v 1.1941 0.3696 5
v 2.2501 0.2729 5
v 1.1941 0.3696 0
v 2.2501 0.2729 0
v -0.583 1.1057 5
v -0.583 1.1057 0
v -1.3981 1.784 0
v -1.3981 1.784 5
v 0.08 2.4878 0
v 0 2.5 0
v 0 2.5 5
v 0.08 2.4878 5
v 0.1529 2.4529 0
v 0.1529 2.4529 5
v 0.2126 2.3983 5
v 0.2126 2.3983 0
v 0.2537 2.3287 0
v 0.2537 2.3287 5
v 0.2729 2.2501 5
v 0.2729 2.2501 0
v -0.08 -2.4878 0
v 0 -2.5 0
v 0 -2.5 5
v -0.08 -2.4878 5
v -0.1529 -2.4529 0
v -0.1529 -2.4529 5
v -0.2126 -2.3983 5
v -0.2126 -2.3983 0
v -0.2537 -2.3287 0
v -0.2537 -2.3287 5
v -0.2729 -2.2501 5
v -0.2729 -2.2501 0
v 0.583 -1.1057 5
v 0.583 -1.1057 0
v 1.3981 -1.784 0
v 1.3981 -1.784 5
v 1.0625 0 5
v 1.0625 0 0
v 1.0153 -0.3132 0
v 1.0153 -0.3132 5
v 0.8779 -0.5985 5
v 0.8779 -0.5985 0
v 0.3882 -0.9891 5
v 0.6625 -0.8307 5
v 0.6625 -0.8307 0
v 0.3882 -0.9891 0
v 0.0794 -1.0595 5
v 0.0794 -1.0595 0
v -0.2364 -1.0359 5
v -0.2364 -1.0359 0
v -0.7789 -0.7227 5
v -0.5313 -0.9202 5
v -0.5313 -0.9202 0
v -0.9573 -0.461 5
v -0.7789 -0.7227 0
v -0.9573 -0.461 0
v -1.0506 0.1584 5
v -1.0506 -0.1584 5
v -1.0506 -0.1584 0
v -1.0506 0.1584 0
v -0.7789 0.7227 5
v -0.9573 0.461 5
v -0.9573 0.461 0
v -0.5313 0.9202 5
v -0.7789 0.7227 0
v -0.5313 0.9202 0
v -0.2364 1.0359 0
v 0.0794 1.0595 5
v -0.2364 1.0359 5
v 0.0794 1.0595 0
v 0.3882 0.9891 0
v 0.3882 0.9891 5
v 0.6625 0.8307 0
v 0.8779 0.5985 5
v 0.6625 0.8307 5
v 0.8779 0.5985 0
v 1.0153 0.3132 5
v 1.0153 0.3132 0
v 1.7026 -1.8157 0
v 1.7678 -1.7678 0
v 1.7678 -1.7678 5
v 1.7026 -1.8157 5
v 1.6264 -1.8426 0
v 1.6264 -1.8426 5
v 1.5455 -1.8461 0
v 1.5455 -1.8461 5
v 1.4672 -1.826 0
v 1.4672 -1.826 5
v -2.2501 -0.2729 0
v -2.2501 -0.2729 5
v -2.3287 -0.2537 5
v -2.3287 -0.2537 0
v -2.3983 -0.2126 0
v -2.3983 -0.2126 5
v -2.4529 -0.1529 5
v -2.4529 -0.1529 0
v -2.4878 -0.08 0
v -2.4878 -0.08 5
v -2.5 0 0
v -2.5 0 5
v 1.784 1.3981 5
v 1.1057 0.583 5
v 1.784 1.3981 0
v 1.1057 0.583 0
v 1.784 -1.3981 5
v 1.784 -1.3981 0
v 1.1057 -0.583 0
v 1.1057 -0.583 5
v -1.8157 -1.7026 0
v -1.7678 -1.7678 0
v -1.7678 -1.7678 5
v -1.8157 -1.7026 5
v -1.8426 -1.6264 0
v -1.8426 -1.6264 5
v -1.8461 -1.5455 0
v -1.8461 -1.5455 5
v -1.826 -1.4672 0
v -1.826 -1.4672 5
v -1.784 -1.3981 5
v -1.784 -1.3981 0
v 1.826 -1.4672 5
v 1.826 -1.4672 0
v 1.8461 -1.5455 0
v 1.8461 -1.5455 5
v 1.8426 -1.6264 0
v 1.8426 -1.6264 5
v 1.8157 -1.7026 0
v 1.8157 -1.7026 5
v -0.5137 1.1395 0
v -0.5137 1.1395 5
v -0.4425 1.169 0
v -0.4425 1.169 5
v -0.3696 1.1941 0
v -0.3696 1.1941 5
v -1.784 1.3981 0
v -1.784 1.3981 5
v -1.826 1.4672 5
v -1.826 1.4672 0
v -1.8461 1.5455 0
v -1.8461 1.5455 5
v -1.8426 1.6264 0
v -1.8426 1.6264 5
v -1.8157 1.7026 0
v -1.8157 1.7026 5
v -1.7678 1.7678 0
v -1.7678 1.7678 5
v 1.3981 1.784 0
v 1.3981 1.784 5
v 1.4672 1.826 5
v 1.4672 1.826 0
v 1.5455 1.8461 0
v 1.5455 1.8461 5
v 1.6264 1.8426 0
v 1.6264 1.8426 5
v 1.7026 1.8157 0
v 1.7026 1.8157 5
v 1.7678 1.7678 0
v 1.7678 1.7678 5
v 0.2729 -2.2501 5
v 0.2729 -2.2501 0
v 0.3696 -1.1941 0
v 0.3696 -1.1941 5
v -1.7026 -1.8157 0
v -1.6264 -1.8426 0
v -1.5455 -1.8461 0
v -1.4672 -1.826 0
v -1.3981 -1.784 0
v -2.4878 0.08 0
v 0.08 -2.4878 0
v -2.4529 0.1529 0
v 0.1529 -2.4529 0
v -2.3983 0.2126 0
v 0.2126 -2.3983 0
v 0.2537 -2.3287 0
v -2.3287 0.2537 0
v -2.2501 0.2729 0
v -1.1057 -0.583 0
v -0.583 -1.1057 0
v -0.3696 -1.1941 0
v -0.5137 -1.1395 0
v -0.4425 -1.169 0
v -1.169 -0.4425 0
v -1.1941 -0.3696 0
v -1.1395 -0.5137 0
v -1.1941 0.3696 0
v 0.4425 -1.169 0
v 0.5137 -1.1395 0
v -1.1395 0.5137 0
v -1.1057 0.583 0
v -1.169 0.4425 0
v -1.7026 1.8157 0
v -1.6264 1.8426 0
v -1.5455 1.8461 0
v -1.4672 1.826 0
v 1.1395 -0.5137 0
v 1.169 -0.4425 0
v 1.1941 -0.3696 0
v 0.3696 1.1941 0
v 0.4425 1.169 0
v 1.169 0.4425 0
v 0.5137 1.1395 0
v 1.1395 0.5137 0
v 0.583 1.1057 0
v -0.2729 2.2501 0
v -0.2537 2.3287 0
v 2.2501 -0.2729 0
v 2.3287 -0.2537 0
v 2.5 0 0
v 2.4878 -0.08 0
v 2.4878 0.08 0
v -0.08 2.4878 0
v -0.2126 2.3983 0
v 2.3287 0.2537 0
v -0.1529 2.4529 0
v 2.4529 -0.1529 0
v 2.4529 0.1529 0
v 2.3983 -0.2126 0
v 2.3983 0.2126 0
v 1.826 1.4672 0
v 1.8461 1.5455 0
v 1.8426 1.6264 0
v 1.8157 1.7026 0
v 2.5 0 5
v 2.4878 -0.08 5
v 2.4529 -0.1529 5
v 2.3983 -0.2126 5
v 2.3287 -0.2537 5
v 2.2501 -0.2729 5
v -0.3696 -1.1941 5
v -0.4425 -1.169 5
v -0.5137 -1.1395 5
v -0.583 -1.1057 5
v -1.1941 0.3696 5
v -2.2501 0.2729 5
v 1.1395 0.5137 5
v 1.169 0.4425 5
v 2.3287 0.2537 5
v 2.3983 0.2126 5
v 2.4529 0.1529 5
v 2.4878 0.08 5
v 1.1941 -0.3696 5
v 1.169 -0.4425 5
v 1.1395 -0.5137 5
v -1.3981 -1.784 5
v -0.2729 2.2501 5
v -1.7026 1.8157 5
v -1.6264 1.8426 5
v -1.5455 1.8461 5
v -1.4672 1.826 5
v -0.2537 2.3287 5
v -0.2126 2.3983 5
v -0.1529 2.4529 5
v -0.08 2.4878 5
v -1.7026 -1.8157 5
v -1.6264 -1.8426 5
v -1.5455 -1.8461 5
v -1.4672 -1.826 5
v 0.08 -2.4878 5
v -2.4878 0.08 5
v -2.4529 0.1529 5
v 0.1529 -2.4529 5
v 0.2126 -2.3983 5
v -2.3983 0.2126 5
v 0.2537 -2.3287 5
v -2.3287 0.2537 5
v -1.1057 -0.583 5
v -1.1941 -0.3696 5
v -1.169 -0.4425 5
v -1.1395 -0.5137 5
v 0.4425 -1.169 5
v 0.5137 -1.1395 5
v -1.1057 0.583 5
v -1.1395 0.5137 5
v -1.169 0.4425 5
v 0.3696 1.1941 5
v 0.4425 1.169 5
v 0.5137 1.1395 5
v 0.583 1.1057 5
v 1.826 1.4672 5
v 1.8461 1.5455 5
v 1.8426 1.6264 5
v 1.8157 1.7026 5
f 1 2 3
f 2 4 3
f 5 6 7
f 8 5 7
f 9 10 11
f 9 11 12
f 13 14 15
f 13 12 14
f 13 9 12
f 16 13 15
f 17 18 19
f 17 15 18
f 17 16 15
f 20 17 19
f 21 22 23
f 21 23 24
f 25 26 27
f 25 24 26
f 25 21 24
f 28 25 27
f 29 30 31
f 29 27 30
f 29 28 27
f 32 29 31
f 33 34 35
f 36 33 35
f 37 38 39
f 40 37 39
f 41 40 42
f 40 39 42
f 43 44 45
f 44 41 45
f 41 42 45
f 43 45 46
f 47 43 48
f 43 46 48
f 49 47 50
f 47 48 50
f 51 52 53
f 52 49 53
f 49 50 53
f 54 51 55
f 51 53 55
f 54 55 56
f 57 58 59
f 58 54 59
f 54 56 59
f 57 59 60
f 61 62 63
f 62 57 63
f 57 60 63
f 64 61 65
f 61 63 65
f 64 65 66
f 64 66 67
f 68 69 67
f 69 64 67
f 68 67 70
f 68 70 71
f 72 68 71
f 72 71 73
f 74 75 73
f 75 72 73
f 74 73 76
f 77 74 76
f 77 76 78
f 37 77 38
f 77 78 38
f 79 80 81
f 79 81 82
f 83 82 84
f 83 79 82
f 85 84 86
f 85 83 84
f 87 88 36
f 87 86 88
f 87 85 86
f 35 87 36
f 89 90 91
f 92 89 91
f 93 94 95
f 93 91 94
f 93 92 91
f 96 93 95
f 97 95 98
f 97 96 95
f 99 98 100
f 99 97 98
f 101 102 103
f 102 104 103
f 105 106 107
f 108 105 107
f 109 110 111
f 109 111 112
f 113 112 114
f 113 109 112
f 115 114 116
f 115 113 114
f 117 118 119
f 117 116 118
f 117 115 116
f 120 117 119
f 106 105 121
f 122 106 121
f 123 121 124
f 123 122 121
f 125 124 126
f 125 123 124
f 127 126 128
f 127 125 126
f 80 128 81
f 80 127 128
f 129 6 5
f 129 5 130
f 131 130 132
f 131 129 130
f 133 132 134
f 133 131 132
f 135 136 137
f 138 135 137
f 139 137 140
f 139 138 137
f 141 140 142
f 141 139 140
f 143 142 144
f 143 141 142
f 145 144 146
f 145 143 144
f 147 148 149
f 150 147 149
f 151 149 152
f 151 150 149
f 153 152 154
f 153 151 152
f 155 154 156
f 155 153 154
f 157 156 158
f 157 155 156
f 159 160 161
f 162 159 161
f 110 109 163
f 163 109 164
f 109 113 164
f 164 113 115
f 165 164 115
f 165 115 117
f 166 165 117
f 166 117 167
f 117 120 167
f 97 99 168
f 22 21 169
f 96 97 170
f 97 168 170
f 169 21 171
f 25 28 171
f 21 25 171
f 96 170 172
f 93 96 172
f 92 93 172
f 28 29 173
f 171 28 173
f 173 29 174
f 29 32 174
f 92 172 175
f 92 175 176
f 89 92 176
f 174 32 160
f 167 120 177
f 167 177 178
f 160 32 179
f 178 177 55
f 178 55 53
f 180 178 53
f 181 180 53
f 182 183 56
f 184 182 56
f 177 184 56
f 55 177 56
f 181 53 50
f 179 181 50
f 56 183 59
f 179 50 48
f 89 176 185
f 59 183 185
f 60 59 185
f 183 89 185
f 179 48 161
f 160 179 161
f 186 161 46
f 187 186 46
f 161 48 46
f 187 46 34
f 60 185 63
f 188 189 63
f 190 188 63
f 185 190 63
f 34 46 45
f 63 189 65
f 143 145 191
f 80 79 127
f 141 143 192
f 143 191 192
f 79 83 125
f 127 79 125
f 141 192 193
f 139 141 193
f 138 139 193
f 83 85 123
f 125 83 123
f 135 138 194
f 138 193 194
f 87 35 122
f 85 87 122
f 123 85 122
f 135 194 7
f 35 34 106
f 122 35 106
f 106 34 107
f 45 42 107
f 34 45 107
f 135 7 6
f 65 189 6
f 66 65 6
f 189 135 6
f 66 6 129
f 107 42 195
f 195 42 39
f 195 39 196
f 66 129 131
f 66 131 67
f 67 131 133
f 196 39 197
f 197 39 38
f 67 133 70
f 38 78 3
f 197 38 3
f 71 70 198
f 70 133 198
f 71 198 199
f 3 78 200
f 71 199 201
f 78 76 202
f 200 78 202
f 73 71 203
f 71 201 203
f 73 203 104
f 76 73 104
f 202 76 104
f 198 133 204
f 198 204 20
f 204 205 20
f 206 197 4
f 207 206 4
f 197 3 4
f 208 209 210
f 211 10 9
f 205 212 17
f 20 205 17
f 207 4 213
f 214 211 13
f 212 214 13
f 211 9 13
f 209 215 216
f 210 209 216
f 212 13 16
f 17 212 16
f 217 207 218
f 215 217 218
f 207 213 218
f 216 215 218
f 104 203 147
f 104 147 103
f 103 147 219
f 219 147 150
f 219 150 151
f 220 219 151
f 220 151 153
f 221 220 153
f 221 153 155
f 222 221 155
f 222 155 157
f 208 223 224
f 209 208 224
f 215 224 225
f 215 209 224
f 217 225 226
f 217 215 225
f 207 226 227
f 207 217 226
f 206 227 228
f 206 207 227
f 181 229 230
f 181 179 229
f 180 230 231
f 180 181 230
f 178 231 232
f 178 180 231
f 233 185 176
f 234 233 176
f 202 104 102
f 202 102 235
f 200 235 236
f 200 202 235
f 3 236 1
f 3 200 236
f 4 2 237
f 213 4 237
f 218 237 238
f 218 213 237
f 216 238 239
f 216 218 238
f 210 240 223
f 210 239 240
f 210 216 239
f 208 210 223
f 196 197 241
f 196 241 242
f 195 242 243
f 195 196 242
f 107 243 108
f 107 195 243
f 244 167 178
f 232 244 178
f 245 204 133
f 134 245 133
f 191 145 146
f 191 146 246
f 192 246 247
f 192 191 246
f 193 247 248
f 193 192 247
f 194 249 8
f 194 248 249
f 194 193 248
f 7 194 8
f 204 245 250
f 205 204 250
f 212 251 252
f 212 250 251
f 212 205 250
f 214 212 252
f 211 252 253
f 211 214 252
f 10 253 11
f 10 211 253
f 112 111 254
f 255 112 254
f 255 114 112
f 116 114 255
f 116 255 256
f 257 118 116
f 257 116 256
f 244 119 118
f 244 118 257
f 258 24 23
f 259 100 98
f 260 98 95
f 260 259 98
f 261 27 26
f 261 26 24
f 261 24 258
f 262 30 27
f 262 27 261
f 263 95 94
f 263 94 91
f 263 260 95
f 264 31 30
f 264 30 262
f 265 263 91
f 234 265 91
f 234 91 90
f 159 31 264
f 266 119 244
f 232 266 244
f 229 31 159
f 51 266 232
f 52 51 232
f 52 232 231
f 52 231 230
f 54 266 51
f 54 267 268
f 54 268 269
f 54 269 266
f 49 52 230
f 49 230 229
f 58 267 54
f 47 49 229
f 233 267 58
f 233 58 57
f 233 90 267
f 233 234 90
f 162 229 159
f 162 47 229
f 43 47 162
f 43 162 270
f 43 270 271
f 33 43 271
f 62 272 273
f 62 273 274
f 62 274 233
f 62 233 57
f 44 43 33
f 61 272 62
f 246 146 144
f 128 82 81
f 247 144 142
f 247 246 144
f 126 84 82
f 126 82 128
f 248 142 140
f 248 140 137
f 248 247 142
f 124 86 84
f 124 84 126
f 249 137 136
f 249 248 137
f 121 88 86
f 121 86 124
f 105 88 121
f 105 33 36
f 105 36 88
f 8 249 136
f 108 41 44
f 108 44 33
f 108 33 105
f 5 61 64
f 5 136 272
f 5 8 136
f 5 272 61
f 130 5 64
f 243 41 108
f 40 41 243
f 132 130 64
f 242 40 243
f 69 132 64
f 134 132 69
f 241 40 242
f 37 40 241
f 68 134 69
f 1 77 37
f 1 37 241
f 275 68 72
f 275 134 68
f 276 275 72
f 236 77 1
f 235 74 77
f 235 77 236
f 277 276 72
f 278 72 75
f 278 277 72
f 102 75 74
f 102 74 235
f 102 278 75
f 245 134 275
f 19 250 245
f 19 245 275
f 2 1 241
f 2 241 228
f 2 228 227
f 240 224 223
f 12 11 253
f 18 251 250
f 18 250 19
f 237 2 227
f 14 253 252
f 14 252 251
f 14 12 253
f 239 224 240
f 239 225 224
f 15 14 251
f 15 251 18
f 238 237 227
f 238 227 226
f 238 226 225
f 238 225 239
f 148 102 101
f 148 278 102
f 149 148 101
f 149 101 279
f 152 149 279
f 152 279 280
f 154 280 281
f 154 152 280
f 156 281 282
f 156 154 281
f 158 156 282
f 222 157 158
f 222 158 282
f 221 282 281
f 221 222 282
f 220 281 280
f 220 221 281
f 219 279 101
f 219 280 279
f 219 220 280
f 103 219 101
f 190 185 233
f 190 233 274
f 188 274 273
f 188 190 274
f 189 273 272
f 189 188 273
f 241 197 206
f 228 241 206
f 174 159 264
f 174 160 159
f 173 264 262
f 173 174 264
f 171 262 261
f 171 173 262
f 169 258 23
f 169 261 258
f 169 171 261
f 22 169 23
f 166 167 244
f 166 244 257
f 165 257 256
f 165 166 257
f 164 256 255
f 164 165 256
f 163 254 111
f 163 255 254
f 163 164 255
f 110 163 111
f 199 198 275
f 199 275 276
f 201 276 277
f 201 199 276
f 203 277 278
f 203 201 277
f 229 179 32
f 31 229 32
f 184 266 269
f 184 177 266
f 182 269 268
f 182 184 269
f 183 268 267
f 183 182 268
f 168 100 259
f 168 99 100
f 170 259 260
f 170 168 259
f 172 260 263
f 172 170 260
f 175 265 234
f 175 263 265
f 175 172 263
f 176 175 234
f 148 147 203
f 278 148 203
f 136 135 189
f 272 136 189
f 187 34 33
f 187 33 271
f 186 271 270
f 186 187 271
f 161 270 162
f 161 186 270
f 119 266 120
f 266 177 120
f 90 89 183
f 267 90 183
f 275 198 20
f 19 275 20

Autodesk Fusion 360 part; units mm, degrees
sketch "Small Head Gear" plane through (0, 0, 0) normal (0, 0, 1) x (1, 0, 0)
  circle A0 centre (0, 0) radius 1.0625
  arc A1 (-0.583, -1.1057) -> (-0.3696, -1.1941) centre (0, 0) ccw
  arc A2 (-1.1941, -0.3696) -> (-1.1057, -0.583) centre (0, 0) ccw
  arc A3 (-1.1057, 0.583) -> (-1.1941, 0.3696) centre (0, 0) ccw
  arc A4 (-0.3696, 1.1941) -> (-0.583, 1.1057) centre (0, 0) ccw
  arc A5 (0.583, 1.1057) -> (0.3696, 1.1941) centre (0, 0) ccw
  arc A6 (1.1941, 0.3696) -> (1.1057, 0.583) centre (0, 0) ccw
  arc A7 (0.3696, -1.1941) -> (0.583, -1.1057) centre (0, 0) ccw
  arc A8 (1.1057, -0.583) -> (1.1941, -0.3696) centre (0, 0) ccw
  line L0 (0, -2.5) -> (0.001, -2.5)
  line L1 (0, -2.5) -> (-0.001, -2.5)
  line L2 (1.7678, -1.7678) -> (1.7684, -1.7671)
  line L3 (1.7678, -1.7678) -> (1.7671, -1.7684)
  line L4 (1.7678, 1.7678) -> (1.7671, 1.7684)
  line L5 (1.7678, 1.7678) -> (1.7684, 1.7671)
  line L6 (0, 2.5) -> (-0.001, 2.5)
  line L7 (0, 2.5) -> (0.001, 2.5)
  line L8 (-1.7678, 1.7678) -> (-1.7684, 1.7671)
  line L9 (-1.7678, 1.7678) -> (-1.7671, 1.7684)
  line L10 (-2.5, 0) -> (-2.5, -0.001)
  line L11 (-2.5, 0) -> (-2.5, 0.001)
  line L12 (-1.7678, -1.7678) -> (-1.7671, -1.7684)
  line L13 (-1.7678, -1.7678) -> (-1.7684, -1.7671)
  line L14 (-0.3696, -1.1941) -> (-0.2729, -2.2501)
  line L15 (0.2729, -2.2501) -> (0.3696, -1.1941)
  line L16 (0.583, -1.1057) -> (1.3981, -1.784)
  line L17 (1.784, -1.3981) -> (1.1057, -0.583)
  line L18 (1.1941, -0.3696) -> (2.2501, -0.2729)
  line L19 (2.2501, 0.2729) -> (1.1941, 0.3696)
  line L20 (1.1057, 0.583) -> (1.784, 1.3981)
  line L21 (1.3981, 1.784) -> (0.583, 1.1057)
  line L22 (0.3696, 1.1941) -> (0.2729, 2.2501)
  line L23 (-0.2729, 2.2501) -> (-0.3696, 1.1941)
  line L24 (-0.583, 1.1057) -> (-1.3981, 1.784)
  line L25 (-1.784, 1.3981) -> (-1.1057, 0.583)
  line L26 (-1.1941, 0.3696) -> (-2.2501, 0.2729)
  line L27 (-2.2501, -0.2729) -> (-1.1941, -0.3696)
  line L28 (-1.1057, -0.583) -> (-1.784, -1.3981)
  line L29 (-1.3981, -1.784) -> (-0.583, -1.1057)
  line L30 (2.5, -0.001) -> (2.5, 0.001)
  arc A9 (-0.2729, -2.2501) -> (0.001, -2.5) centre (0.001, -2.225) ccw
  arc A10 (-0.001, -2.5) -> (0.2729, -2.2501) centre (-0.001, -2.225) ccw
  arc A11 (1.3981, -1.784) -> (1.7684, -1.7671) centre (1.574, -1.5726) ccw
  arc A12 (1.7671, -1.7684) -> (1.784, -1.3981) centre (1.5726, -1.574) ccw
  arc A13 (2.2501, -0.2729) -> (2.5, 0.001) centre (2.225, 0.001) ccw
  arc A14 (2.5, -0.001) -> (2.2501, 0.2729) centre (2.225, -0.001) ccw
  arc A15 (1.784, 1.3981) -> (1.7671, 1.7684) centre (1.5726, 1.574) ccw
  arc A16 (1.7684, 1.7671) -> (1.3981, 1.784) centre (1.574, 1.5726) ccw
  arc A17 (0.2729, 2.2501) -> (-0.001, 2.5) centre (-0.001, 2.225) ccw
  arc A18 (0.001, 2.5) -> (-0.2729, 2.2501) centre (0.001, 2.225) ccw
  arc A19 (-1.3981, 1.784) -> (-1.7684, 1.7671) centre (-1.574, 1.5726) ccw
  arc A20 (-1.7671, 1.7684) -> (-1.784, 1.3981) centre (-1.5726, 1.574) ccw
  arc A21 (-2.2501, 0.2729) -> (-2.5, -0.001) centre (-2.225, -0.001) ccw
  arc A22 (-2.5, 0.001) -> (-2.2501, -0.2729) centre (-2.225, 0.001) ccw
  arc A23 (-1.7684, -1.7671) -> (-1.3981, -1.784) centre (-1.574, -1.5726) ccw
  arc A24 (-1.784, -1.3981) -> (-1.7671, -1.7684) centre (-1.5726, -1.574) ccw
extrude "Extrude1" add sketch "Small Head Gear" along normal blind 5
